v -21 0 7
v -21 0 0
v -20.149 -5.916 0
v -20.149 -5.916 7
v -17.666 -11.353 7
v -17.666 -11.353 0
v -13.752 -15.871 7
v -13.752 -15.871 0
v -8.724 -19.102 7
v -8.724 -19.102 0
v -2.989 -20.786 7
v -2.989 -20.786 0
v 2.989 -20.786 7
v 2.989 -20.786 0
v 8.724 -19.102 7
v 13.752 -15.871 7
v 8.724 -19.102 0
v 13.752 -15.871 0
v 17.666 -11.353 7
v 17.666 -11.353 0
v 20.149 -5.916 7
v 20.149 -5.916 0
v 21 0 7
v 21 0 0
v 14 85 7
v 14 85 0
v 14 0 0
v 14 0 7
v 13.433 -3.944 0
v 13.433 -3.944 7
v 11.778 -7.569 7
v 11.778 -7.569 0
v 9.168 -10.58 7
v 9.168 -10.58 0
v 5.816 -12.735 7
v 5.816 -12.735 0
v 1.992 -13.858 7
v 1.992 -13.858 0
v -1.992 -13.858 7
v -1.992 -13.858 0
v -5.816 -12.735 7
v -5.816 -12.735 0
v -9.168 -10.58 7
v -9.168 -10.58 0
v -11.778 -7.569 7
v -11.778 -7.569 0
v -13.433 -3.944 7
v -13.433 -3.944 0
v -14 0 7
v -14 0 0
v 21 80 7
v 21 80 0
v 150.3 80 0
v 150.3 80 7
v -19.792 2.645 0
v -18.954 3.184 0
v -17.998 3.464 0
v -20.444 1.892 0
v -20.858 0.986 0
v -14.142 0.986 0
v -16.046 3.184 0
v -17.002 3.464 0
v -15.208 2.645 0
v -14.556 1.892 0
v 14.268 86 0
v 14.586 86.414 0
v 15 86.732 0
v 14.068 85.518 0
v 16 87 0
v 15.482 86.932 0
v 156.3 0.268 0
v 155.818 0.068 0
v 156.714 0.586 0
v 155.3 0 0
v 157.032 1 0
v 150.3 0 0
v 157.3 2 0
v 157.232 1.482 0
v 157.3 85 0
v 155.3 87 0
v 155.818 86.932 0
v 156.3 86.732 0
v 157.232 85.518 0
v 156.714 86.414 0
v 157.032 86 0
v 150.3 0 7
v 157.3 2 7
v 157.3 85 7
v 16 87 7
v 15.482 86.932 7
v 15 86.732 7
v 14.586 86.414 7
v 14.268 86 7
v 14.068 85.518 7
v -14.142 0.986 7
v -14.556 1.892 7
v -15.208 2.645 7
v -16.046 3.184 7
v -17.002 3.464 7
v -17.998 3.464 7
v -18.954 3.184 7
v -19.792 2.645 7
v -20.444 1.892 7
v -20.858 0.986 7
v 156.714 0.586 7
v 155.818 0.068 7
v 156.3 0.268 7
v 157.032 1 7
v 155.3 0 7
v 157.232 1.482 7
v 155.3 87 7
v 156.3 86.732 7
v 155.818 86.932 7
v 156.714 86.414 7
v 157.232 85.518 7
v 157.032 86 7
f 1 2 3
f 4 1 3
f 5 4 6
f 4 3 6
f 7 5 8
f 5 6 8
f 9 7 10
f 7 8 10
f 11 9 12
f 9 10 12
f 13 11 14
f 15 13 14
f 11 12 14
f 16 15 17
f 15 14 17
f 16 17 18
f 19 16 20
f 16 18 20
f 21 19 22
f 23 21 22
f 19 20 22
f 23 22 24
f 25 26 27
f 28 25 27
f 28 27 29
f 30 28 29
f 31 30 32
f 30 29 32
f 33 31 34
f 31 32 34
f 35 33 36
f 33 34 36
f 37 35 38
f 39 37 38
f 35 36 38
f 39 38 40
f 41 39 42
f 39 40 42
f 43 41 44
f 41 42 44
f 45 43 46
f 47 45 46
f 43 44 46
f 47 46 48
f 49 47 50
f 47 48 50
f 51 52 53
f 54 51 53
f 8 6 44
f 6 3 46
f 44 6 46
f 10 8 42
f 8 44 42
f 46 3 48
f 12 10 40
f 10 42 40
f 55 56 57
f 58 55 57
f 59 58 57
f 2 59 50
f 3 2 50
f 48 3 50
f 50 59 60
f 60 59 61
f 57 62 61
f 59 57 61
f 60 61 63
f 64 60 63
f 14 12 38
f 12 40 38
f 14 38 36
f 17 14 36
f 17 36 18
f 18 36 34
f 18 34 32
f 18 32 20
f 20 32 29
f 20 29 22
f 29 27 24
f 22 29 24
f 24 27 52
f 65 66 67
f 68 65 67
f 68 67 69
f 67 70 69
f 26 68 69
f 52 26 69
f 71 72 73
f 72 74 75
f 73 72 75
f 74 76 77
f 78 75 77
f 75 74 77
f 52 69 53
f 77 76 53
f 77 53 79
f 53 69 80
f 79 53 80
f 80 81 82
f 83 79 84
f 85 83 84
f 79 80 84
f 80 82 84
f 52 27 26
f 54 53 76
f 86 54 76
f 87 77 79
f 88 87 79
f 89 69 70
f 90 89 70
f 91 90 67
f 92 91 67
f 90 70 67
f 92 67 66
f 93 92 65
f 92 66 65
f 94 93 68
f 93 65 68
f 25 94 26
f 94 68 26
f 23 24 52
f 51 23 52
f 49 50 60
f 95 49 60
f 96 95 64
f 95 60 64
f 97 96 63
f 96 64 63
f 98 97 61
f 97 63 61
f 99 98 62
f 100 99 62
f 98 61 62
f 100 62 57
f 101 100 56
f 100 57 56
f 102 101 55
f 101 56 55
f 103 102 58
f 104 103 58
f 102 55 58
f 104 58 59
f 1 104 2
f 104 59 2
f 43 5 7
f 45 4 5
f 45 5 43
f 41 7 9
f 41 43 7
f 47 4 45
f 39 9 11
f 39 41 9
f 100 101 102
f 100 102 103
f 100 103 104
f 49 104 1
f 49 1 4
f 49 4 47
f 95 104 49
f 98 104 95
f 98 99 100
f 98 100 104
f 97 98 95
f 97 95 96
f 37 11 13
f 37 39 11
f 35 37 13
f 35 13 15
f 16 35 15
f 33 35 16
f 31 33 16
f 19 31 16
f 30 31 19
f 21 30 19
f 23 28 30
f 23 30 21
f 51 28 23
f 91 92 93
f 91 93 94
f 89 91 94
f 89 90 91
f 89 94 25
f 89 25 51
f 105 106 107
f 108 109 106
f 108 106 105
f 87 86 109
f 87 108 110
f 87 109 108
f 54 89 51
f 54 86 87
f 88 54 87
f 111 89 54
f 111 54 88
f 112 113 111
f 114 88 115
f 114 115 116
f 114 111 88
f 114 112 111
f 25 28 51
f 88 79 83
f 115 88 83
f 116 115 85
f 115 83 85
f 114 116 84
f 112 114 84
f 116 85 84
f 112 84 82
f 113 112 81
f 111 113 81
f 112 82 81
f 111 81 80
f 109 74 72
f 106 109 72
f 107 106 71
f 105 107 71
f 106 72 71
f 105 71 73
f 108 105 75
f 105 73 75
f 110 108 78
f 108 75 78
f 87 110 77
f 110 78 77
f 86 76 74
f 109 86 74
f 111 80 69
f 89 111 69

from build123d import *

# Parameters (mm, degrees)
F2_DEPTH = 7


with BuildPart() as f2:
    # F1 (on Top) → F2 (new body)
    with BuildSketch(Plane.XY):
        with BuildLine():
            ThreePointArc((14, 0), (0, -14), (-14, 0))
            ThreePointArc((-14, 0), (-17.5, 3.5), (-21, 0))
            ThreePointArc((-21, 0), (0, -21), (21, 0))
            Line((21, 0), (21, 80))
            Line((21, 80), (150.3, 80))
            Line((150.3, 80), (150.3, 0))
            Line((150.3, 0), (155.3, 0))
            ThreePointArc((155.3, 0), (156.7142135624, 0.5857864376), (157.3, 2))
            Line((157.3, 2), (157.3, 85))
            ThreePointArc((157.3, 85), (156.7142135624, 86.4142135624), (155.3, 87))
            Line((155.3, 87), (16, 87))
            ThreePointArc((16, 87), (14.5857864376, 86.4142135624), (14, 85))
            Line((14, 85), (14, 0))
        make_face()
    extrude(amount=F2_DEPTH)


solid = f2.part
